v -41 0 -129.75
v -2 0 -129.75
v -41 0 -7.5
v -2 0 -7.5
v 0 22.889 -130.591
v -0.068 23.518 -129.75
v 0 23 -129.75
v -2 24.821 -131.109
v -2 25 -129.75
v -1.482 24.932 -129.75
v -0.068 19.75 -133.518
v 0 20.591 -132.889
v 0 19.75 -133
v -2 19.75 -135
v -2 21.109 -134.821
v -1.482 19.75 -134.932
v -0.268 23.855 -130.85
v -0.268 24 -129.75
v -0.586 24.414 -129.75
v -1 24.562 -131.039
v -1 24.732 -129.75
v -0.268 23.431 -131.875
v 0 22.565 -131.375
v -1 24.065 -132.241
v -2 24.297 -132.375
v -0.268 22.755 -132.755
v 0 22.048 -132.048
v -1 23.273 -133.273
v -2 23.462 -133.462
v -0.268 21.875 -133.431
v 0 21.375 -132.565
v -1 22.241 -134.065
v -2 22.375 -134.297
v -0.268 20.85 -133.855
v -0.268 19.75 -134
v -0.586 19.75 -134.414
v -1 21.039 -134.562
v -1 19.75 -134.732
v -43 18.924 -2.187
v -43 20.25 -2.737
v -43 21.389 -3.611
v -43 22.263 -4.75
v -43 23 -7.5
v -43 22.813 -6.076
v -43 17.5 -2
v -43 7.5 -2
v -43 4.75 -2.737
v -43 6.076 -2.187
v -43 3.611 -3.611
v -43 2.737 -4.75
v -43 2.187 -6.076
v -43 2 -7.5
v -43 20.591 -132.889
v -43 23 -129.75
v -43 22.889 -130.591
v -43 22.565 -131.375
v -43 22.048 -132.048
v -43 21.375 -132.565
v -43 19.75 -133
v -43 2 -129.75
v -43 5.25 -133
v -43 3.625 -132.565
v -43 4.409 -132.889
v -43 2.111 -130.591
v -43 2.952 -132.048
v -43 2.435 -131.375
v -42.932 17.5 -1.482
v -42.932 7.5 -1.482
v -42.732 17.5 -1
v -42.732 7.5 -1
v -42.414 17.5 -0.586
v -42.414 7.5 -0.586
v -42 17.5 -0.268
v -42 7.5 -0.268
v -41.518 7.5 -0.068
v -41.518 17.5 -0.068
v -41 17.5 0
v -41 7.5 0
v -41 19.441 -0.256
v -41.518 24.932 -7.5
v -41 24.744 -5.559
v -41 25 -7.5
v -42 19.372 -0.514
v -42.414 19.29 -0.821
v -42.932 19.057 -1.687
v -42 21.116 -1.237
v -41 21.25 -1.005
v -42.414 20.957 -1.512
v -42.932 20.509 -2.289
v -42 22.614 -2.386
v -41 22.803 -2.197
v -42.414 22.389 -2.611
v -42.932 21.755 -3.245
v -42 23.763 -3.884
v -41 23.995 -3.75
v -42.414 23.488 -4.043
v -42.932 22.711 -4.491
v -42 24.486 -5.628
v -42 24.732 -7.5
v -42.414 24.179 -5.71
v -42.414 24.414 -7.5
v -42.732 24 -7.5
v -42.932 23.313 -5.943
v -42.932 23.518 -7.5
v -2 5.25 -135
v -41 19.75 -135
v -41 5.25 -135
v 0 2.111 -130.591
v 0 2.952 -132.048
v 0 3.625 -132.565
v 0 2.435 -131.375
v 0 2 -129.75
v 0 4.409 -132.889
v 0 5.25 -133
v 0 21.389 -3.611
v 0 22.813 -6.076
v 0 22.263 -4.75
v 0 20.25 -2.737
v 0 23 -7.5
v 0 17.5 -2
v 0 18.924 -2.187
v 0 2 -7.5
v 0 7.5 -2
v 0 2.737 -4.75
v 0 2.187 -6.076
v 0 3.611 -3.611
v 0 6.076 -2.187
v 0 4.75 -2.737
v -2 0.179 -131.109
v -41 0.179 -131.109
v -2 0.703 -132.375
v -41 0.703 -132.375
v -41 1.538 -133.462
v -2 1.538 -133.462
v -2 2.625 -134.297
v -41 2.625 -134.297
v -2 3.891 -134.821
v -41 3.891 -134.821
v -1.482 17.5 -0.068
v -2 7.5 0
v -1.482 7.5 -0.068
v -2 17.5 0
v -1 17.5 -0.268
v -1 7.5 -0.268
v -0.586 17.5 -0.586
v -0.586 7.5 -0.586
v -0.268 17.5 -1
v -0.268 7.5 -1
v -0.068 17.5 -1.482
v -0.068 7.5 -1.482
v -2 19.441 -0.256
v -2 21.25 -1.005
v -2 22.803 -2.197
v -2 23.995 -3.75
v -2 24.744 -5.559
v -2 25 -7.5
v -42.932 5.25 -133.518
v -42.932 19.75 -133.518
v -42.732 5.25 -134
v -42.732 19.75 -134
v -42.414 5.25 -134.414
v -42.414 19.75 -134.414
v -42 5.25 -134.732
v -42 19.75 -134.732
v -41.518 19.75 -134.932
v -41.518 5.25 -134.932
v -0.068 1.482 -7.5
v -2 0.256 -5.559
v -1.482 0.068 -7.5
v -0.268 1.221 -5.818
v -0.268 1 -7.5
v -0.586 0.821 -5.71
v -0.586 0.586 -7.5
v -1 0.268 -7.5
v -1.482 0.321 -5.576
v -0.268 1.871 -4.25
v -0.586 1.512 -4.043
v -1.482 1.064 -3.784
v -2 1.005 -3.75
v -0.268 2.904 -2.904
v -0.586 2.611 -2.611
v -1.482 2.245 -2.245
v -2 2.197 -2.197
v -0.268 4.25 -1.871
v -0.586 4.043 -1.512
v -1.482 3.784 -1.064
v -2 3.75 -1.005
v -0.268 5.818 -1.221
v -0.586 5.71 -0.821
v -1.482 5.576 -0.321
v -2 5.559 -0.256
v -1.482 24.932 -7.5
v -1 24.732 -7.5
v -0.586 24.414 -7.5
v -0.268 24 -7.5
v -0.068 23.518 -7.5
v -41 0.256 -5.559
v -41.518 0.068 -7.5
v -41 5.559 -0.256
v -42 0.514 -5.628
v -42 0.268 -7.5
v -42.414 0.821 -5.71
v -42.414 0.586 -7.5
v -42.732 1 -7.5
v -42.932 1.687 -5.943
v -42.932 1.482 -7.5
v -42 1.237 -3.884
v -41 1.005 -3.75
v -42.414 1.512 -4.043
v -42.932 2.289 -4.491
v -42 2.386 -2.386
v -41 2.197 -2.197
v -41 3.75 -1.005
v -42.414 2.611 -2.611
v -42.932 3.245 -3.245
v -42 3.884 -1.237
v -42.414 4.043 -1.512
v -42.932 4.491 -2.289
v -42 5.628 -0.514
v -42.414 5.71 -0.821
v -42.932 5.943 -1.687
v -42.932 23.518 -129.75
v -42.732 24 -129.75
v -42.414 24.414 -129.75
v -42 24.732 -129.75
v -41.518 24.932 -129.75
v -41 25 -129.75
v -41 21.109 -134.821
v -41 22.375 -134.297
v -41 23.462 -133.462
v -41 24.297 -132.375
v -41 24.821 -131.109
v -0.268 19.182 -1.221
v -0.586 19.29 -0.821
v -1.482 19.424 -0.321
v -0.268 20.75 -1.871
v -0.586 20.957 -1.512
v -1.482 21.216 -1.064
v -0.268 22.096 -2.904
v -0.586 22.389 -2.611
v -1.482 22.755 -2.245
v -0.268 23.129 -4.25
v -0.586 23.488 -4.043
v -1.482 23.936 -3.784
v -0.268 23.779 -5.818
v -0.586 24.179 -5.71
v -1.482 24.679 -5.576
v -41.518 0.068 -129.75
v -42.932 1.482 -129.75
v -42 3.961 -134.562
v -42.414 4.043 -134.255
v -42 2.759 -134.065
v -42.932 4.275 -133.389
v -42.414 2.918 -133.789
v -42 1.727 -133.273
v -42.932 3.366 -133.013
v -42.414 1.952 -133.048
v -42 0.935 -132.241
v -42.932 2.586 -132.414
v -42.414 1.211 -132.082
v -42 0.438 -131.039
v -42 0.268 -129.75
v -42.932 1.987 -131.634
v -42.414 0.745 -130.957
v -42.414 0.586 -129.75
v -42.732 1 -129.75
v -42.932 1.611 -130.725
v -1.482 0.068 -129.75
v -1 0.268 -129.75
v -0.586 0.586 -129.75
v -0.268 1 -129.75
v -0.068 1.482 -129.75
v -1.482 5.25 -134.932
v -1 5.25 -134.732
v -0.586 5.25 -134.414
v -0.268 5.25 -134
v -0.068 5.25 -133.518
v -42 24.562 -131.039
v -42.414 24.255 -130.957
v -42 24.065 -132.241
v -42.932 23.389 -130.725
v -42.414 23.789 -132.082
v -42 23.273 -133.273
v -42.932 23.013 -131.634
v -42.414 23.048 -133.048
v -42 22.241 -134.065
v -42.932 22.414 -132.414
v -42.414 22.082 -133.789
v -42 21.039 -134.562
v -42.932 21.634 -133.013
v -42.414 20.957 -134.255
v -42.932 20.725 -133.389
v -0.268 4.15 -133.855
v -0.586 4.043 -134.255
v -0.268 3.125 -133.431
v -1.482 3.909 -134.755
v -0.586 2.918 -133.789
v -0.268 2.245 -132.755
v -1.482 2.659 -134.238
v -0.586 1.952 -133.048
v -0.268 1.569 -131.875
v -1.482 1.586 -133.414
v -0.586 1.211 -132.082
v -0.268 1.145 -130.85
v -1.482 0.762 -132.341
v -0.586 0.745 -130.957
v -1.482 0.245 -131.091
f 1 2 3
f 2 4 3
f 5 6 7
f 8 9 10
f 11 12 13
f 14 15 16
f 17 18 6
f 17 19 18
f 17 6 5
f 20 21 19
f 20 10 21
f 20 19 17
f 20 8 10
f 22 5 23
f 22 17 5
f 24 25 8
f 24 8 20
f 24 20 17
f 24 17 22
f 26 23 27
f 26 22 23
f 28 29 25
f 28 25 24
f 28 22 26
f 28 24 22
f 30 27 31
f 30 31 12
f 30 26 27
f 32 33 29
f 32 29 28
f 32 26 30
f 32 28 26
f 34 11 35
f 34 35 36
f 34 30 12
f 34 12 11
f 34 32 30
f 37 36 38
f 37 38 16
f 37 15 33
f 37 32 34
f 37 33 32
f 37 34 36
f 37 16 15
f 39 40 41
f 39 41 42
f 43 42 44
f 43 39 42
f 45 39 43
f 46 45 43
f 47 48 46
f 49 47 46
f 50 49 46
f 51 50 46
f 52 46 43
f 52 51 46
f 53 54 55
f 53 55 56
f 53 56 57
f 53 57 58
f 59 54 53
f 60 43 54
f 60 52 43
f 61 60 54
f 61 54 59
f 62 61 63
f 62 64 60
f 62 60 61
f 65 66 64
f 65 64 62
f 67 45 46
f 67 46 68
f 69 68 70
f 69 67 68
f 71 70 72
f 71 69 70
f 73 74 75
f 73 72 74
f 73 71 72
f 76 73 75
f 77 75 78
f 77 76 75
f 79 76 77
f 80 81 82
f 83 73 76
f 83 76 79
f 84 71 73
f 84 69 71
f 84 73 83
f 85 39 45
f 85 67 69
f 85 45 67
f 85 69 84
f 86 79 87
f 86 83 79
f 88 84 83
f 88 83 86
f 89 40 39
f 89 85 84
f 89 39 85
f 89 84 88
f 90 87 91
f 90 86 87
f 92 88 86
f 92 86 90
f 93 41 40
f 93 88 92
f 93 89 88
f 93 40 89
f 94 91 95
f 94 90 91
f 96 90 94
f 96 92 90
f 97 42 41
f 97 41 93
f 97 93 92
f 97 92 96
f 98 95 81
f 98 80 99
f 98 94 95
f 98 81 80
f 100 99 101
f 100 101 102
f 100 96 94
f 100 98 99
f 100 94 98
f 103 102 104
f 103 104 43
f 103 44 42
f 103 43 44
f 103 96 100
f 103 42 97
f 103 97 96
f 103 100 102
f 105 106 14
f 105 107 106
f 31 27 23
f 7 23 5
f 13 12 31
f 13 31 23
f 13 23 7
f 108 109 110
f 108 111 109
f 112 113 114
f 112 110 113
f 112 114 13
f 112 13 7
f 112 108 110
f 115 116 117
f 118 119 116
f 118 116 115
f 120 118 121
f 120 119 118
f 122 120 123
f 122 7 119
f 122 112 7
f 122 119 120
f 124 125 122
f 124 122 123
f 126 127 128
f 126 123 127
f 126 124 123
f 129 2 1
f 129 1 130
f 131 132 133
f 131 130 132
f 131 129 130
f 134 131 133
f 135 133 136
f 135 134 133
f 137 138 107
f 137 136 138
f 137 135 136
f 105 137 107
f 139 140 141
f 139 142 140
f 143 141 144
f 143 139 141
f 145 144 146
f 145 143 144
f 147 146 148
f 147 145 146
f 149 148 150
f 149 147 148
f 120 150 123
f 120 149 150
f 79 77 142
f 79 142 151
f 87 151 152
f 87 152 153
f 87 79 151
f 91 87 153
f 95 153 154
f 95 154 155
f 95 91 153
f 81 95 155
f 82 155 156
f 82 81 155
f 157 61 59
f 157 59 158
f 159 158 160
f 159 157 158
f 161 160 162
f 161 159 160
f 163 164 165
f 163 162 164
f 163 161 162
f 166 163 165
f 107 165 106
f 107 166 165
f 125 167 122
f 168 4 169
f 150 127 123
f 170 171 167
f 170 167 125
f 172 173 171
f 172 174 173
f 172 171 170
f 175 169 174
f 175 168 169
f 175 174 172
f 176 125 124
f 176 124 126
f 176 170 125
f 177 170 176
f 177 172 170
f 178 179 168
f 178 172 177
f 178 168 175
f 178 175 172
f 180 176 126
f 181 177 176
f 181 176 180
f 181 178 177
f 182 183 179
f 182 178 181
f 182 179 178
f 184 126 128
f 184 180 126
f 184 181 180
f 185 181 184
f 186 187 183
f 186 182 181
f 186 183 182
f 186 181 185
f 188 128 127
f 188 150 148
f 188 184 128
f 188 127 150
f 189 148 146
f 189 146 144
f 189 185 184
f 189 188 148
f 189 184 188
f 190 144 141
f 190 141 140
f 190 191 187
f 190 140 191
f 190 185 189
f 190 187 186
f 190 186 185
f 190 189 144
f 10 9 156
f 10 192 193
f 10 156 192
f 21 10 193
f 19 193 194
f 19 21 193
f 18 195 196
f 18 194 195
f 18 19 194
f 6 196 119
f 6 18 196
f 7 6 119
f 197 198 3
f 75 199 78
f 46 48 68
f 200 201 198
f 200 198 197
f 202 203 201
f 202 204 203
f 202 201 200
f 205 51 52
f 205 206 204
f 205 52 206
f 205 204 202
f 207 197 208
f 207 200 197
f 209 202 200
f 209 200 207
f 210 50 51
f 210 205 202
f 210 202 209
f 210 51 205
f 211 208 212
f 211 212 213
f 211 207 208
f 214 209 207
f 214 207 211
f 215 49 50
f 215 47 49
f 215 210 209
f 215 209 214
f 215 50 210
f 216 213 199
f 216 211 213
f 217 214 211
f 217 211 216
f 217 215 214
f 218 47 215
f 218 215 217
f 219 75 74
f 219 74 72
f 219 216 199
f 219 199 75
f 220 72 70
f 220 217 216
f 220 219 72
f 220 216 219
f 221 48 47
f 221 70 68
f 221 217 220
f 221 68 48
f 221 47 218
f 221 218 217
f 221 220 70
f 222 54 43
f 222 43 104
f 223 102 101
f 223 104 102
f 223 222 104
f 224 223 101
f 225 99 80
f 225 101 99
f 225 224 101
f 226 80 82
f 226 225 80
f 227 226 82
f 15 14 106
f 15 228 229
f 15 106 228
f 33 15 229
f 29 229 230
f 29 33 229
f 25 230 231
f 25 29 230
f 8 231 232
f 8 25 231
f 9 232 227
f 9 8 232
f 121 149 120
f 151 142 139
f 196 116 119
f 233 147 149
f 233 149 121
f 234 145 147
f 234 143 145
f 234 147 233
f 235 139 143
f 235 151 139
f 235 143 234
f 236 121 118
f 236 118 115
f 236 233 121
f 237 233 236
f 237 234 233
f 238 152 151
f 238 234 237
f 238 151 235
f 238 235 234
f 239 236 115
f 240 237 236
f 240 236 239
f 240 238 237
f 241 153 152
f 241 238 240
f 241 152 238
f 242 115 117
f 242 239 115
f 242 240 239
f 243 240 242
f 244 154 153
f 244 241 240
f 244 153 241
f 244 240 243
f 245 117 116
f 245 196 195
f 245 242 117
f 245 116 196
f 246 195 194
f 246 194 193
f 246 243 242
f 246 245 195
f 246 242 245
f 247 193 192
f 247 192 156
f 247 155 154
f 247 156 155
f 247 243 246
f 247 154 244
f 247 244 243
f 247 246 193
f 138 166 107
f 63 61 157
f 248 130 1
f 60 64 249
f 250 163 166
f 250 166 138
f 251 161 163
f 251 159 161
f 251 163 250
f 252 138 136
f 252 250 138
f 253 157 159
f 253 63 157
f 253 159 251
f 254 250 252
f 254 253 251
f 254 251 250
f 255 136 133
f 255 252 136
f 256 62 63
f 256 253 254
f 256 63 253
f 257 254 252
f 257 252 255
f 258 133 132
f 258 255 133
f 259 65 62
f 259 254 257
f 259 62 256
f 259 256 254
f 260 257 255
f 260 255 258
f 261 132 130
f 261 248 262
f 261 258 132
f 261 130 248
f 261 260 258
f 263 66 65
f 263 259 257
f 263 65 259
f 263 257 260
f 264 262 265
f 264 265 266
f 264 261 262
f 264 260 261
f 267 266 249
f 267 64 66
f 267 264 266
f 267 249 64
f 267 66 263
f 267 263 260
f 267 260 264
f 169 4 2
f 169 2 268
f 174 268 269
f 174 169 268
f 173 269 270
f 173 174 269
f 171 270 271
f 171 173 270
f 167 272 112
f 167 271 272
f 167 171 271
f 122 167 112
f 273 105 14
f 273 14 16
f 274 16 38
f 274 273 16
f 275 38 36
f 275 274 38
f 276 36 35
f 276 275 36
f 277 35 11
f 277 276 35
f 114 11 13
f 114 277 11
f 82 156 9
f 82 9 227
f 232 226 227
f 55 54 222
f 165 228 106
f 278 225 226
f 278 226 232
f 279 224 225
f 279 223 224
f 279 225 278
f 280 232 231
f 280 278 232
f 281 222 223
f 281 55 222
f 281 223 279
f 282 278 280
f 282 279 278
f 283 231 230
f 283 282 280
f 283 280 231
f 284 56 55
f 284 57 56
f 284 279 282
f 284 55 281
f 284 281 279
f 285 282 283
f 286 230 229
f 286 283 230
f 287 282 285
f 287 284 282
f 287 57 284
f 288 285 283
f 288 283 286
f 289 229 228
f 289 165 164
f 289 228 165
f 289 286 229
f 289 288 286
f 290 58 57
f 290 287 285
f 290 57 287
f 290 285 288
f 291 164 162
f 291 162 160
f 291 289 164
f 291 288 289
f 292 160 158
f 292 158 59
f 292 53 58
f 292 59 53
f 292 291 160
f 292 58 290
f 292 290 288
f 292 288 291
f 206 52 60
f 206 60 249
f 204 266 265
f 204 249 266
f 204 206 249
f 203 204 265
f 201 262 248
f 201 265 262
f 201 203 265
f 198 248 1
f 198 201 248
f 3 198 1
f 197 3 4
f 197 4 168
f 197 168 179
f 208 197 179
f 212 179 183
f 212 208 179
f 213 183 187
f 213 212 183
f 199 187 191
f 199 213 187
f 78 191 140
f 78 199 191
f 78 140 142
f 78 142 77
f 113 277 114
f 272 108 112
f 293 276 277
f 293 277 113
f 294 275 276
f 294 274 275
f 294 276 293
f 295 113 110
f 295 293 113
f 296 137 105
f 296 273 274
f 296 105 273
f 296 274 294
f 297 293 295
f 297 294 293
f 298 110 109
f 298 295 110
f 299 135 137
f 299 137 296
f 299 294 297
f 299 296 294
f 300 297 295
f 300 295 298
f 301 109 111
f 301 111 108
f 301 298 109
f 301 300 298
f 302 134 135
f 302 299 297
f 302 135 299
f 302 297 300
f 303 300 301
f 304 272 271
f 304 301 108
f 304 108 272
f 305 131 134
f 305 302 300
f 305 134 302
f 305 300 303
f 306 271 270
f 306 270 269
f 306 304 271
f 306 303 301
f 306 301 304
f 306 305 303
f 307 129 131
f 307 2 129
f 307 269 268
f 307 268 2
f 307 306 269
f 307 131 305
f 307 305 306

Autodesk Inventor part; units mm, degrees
ref_plane "YZ Plane" through (0, 0, 0) normal (1, 0, 0) x (0, 1, 0)
ref_plane "XZ Plane" through (0, 0, 0) normal (0, 1, 0) x (-1, 0, 0)
ref_plane "XY Plane" through (0, 0, 0) normal (0, 0, 1) x (1, 0, 0)
sketch "Sketch2" plane through (0, 0, 0) normal (0, 1, 0) x (-1, 0, 0)
  line L0 (0, 0) -> (43, 0)
  line L1 (43, 0) -> (43, -135)
  line L2 (43, -135) -> (0, -135)
  line L3 (0, -135) -> (0, 0)
  dimension "d0" = 43
  dimension "d1" = 135
extrude "Extrusion1" add sketch "Sketch2" along normal blind 25
fillet "Fillet1" radius 7.5 2 edges at (-21.5, 25, 0) (-21.5, 0, 0)
fillet "Fillet2" radius 5.25 2 edges at (-21.5, 25, -135) (-21.5, 0, -135)
fillet "Fillet3" radius 2 16 edges at (0, 23.4623, -133.4623) (0, 12.5, -135) (0, 1.5377, -133.4623) (0, 0, -68.625) (0, 2.1967, -2.1967) (0, 12.5, 0) (0, 22.8033, -2.1967) (0, 25, -68.625) (-43, 22.8033, -2.1967) (-43, 12.5, 0) (-43, 2.1967, -2.1967) (-43, 0, -68.625) (-43, 1.5377, -133.4623) (-43, 12.5, -135) (-43, 23.4623, -133.4623) (-43, 25, -68.625)
properties part number "LiPo" material "PPS Plastic"
